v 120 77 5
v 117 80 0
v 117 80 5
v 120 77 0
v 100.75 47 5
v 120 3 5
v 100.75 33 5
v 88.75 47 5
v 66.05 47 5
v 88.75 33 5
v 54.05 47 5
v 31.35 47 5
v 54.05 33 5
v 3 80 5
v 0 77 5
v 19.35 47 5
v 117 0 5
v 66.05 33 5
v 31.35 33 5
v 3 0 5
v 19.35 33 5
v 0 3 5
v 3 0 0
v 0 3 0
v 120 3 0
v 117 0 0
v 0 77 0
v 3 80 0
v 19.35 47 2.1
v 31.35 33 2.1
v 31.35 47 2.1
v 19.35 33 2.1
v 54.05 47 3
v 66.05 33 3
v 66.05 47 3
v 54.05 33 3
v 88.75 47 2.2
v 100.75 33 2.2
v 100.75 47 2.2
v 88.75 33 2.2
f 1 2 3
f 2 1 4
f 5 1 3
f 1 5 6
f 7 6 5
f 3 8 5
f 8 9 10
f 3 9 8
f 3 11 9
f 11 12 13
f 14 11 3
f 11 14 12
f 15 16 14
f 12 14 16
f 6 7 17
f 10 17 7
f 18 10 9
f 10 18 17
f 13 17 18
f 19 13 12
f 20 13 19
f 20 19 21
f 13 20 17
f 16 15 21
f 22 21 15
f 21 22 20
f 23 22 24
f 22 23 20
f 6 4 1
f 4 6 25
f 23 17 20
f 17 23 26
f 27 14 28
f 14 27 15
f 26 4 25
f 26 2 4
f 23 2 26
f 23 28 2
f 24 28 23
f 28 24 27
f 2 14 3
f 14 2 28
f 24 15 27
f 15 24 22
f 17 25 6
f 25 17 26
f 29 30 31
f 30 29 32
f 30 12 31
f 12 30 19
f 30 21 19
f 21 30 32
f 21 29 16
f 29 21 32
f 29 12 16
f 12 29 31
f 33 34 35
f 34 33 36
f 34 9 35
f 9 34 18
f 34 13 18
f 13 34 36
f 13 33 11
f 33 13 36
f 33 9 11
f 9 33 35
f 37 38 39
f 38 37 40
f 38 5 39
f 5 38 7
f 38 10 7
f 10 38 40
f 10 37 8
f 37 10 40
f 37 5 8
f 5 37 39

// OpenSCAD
$fn = 32;

// ----------------------------------------------------------------------
// Windowed plate: 3 voids, 120 x 80 x 5 mm
// ----------------------------------------------------------------------

// --- parameters (mm) ---
plate_l = 120;            // plate length, X
plate_w = 80;             // plate width, Y
plate_t = 5;              // plate thickness, Z
edge_margin = 8;          // wall from the plate edge to any window
windows = 3;              // number of windows in the row
win_l = 12;               // window length
win_w = 14;               // window width
win_pitch = 34.7;         // window pitch along X
depth_1 = 2.9;            // depth of void 1 (full thickness = through)
depth_2 = 2;              // depth of void 2 (full thickness = through)
depth_3 = 2.8;            // depth of void 3 (full thickness = through)
corner_c = 3;             // corner chamfer of the plate
fit_tol = 0.1;            // declared fit tolerance (prompt contract)
free_tol = 0.5;           // declared free tolerance (prompt contract)

profile = [[3, 0], [117, 0], [120, 3], [120, 77], [117, 80], [3, 80], [0, 77], [0, 3]];  // primary outline, 8 points, counter clockwise
void_1 = [[19.35, 33], [31.35, 33], [31.35, 47], [19.35, 47]];  // window 1 of the row, 4 points
void_2 = [[54.05, 33], [66.05, 33], [66.05, 47], [54.05, 47]];  // window 2 of the row, 4 points
void_3 = [[88.75, 33], [100.75, 33], [100.75, 47], [88.75, 47]];  // window 3 of the row, 4 points

// --- the one profile operation ---
difference() {
  linear_extrude(height = plate_t) polygon(points = profile);
  translate([0, 0, plate_t - depth_1])
    linear_extrude(height = depth_1 + 1) polygon(points = void_1);
  translate([0, 0, plate_t - depth_2])
    linear_extrude(height = depth_2 + 1) polygon(points = void_2);
  translate([0, 0, plate_t - depth_3])
    linear_extrude(height = depth_3 + 1) polygon(points = void_3);
}
